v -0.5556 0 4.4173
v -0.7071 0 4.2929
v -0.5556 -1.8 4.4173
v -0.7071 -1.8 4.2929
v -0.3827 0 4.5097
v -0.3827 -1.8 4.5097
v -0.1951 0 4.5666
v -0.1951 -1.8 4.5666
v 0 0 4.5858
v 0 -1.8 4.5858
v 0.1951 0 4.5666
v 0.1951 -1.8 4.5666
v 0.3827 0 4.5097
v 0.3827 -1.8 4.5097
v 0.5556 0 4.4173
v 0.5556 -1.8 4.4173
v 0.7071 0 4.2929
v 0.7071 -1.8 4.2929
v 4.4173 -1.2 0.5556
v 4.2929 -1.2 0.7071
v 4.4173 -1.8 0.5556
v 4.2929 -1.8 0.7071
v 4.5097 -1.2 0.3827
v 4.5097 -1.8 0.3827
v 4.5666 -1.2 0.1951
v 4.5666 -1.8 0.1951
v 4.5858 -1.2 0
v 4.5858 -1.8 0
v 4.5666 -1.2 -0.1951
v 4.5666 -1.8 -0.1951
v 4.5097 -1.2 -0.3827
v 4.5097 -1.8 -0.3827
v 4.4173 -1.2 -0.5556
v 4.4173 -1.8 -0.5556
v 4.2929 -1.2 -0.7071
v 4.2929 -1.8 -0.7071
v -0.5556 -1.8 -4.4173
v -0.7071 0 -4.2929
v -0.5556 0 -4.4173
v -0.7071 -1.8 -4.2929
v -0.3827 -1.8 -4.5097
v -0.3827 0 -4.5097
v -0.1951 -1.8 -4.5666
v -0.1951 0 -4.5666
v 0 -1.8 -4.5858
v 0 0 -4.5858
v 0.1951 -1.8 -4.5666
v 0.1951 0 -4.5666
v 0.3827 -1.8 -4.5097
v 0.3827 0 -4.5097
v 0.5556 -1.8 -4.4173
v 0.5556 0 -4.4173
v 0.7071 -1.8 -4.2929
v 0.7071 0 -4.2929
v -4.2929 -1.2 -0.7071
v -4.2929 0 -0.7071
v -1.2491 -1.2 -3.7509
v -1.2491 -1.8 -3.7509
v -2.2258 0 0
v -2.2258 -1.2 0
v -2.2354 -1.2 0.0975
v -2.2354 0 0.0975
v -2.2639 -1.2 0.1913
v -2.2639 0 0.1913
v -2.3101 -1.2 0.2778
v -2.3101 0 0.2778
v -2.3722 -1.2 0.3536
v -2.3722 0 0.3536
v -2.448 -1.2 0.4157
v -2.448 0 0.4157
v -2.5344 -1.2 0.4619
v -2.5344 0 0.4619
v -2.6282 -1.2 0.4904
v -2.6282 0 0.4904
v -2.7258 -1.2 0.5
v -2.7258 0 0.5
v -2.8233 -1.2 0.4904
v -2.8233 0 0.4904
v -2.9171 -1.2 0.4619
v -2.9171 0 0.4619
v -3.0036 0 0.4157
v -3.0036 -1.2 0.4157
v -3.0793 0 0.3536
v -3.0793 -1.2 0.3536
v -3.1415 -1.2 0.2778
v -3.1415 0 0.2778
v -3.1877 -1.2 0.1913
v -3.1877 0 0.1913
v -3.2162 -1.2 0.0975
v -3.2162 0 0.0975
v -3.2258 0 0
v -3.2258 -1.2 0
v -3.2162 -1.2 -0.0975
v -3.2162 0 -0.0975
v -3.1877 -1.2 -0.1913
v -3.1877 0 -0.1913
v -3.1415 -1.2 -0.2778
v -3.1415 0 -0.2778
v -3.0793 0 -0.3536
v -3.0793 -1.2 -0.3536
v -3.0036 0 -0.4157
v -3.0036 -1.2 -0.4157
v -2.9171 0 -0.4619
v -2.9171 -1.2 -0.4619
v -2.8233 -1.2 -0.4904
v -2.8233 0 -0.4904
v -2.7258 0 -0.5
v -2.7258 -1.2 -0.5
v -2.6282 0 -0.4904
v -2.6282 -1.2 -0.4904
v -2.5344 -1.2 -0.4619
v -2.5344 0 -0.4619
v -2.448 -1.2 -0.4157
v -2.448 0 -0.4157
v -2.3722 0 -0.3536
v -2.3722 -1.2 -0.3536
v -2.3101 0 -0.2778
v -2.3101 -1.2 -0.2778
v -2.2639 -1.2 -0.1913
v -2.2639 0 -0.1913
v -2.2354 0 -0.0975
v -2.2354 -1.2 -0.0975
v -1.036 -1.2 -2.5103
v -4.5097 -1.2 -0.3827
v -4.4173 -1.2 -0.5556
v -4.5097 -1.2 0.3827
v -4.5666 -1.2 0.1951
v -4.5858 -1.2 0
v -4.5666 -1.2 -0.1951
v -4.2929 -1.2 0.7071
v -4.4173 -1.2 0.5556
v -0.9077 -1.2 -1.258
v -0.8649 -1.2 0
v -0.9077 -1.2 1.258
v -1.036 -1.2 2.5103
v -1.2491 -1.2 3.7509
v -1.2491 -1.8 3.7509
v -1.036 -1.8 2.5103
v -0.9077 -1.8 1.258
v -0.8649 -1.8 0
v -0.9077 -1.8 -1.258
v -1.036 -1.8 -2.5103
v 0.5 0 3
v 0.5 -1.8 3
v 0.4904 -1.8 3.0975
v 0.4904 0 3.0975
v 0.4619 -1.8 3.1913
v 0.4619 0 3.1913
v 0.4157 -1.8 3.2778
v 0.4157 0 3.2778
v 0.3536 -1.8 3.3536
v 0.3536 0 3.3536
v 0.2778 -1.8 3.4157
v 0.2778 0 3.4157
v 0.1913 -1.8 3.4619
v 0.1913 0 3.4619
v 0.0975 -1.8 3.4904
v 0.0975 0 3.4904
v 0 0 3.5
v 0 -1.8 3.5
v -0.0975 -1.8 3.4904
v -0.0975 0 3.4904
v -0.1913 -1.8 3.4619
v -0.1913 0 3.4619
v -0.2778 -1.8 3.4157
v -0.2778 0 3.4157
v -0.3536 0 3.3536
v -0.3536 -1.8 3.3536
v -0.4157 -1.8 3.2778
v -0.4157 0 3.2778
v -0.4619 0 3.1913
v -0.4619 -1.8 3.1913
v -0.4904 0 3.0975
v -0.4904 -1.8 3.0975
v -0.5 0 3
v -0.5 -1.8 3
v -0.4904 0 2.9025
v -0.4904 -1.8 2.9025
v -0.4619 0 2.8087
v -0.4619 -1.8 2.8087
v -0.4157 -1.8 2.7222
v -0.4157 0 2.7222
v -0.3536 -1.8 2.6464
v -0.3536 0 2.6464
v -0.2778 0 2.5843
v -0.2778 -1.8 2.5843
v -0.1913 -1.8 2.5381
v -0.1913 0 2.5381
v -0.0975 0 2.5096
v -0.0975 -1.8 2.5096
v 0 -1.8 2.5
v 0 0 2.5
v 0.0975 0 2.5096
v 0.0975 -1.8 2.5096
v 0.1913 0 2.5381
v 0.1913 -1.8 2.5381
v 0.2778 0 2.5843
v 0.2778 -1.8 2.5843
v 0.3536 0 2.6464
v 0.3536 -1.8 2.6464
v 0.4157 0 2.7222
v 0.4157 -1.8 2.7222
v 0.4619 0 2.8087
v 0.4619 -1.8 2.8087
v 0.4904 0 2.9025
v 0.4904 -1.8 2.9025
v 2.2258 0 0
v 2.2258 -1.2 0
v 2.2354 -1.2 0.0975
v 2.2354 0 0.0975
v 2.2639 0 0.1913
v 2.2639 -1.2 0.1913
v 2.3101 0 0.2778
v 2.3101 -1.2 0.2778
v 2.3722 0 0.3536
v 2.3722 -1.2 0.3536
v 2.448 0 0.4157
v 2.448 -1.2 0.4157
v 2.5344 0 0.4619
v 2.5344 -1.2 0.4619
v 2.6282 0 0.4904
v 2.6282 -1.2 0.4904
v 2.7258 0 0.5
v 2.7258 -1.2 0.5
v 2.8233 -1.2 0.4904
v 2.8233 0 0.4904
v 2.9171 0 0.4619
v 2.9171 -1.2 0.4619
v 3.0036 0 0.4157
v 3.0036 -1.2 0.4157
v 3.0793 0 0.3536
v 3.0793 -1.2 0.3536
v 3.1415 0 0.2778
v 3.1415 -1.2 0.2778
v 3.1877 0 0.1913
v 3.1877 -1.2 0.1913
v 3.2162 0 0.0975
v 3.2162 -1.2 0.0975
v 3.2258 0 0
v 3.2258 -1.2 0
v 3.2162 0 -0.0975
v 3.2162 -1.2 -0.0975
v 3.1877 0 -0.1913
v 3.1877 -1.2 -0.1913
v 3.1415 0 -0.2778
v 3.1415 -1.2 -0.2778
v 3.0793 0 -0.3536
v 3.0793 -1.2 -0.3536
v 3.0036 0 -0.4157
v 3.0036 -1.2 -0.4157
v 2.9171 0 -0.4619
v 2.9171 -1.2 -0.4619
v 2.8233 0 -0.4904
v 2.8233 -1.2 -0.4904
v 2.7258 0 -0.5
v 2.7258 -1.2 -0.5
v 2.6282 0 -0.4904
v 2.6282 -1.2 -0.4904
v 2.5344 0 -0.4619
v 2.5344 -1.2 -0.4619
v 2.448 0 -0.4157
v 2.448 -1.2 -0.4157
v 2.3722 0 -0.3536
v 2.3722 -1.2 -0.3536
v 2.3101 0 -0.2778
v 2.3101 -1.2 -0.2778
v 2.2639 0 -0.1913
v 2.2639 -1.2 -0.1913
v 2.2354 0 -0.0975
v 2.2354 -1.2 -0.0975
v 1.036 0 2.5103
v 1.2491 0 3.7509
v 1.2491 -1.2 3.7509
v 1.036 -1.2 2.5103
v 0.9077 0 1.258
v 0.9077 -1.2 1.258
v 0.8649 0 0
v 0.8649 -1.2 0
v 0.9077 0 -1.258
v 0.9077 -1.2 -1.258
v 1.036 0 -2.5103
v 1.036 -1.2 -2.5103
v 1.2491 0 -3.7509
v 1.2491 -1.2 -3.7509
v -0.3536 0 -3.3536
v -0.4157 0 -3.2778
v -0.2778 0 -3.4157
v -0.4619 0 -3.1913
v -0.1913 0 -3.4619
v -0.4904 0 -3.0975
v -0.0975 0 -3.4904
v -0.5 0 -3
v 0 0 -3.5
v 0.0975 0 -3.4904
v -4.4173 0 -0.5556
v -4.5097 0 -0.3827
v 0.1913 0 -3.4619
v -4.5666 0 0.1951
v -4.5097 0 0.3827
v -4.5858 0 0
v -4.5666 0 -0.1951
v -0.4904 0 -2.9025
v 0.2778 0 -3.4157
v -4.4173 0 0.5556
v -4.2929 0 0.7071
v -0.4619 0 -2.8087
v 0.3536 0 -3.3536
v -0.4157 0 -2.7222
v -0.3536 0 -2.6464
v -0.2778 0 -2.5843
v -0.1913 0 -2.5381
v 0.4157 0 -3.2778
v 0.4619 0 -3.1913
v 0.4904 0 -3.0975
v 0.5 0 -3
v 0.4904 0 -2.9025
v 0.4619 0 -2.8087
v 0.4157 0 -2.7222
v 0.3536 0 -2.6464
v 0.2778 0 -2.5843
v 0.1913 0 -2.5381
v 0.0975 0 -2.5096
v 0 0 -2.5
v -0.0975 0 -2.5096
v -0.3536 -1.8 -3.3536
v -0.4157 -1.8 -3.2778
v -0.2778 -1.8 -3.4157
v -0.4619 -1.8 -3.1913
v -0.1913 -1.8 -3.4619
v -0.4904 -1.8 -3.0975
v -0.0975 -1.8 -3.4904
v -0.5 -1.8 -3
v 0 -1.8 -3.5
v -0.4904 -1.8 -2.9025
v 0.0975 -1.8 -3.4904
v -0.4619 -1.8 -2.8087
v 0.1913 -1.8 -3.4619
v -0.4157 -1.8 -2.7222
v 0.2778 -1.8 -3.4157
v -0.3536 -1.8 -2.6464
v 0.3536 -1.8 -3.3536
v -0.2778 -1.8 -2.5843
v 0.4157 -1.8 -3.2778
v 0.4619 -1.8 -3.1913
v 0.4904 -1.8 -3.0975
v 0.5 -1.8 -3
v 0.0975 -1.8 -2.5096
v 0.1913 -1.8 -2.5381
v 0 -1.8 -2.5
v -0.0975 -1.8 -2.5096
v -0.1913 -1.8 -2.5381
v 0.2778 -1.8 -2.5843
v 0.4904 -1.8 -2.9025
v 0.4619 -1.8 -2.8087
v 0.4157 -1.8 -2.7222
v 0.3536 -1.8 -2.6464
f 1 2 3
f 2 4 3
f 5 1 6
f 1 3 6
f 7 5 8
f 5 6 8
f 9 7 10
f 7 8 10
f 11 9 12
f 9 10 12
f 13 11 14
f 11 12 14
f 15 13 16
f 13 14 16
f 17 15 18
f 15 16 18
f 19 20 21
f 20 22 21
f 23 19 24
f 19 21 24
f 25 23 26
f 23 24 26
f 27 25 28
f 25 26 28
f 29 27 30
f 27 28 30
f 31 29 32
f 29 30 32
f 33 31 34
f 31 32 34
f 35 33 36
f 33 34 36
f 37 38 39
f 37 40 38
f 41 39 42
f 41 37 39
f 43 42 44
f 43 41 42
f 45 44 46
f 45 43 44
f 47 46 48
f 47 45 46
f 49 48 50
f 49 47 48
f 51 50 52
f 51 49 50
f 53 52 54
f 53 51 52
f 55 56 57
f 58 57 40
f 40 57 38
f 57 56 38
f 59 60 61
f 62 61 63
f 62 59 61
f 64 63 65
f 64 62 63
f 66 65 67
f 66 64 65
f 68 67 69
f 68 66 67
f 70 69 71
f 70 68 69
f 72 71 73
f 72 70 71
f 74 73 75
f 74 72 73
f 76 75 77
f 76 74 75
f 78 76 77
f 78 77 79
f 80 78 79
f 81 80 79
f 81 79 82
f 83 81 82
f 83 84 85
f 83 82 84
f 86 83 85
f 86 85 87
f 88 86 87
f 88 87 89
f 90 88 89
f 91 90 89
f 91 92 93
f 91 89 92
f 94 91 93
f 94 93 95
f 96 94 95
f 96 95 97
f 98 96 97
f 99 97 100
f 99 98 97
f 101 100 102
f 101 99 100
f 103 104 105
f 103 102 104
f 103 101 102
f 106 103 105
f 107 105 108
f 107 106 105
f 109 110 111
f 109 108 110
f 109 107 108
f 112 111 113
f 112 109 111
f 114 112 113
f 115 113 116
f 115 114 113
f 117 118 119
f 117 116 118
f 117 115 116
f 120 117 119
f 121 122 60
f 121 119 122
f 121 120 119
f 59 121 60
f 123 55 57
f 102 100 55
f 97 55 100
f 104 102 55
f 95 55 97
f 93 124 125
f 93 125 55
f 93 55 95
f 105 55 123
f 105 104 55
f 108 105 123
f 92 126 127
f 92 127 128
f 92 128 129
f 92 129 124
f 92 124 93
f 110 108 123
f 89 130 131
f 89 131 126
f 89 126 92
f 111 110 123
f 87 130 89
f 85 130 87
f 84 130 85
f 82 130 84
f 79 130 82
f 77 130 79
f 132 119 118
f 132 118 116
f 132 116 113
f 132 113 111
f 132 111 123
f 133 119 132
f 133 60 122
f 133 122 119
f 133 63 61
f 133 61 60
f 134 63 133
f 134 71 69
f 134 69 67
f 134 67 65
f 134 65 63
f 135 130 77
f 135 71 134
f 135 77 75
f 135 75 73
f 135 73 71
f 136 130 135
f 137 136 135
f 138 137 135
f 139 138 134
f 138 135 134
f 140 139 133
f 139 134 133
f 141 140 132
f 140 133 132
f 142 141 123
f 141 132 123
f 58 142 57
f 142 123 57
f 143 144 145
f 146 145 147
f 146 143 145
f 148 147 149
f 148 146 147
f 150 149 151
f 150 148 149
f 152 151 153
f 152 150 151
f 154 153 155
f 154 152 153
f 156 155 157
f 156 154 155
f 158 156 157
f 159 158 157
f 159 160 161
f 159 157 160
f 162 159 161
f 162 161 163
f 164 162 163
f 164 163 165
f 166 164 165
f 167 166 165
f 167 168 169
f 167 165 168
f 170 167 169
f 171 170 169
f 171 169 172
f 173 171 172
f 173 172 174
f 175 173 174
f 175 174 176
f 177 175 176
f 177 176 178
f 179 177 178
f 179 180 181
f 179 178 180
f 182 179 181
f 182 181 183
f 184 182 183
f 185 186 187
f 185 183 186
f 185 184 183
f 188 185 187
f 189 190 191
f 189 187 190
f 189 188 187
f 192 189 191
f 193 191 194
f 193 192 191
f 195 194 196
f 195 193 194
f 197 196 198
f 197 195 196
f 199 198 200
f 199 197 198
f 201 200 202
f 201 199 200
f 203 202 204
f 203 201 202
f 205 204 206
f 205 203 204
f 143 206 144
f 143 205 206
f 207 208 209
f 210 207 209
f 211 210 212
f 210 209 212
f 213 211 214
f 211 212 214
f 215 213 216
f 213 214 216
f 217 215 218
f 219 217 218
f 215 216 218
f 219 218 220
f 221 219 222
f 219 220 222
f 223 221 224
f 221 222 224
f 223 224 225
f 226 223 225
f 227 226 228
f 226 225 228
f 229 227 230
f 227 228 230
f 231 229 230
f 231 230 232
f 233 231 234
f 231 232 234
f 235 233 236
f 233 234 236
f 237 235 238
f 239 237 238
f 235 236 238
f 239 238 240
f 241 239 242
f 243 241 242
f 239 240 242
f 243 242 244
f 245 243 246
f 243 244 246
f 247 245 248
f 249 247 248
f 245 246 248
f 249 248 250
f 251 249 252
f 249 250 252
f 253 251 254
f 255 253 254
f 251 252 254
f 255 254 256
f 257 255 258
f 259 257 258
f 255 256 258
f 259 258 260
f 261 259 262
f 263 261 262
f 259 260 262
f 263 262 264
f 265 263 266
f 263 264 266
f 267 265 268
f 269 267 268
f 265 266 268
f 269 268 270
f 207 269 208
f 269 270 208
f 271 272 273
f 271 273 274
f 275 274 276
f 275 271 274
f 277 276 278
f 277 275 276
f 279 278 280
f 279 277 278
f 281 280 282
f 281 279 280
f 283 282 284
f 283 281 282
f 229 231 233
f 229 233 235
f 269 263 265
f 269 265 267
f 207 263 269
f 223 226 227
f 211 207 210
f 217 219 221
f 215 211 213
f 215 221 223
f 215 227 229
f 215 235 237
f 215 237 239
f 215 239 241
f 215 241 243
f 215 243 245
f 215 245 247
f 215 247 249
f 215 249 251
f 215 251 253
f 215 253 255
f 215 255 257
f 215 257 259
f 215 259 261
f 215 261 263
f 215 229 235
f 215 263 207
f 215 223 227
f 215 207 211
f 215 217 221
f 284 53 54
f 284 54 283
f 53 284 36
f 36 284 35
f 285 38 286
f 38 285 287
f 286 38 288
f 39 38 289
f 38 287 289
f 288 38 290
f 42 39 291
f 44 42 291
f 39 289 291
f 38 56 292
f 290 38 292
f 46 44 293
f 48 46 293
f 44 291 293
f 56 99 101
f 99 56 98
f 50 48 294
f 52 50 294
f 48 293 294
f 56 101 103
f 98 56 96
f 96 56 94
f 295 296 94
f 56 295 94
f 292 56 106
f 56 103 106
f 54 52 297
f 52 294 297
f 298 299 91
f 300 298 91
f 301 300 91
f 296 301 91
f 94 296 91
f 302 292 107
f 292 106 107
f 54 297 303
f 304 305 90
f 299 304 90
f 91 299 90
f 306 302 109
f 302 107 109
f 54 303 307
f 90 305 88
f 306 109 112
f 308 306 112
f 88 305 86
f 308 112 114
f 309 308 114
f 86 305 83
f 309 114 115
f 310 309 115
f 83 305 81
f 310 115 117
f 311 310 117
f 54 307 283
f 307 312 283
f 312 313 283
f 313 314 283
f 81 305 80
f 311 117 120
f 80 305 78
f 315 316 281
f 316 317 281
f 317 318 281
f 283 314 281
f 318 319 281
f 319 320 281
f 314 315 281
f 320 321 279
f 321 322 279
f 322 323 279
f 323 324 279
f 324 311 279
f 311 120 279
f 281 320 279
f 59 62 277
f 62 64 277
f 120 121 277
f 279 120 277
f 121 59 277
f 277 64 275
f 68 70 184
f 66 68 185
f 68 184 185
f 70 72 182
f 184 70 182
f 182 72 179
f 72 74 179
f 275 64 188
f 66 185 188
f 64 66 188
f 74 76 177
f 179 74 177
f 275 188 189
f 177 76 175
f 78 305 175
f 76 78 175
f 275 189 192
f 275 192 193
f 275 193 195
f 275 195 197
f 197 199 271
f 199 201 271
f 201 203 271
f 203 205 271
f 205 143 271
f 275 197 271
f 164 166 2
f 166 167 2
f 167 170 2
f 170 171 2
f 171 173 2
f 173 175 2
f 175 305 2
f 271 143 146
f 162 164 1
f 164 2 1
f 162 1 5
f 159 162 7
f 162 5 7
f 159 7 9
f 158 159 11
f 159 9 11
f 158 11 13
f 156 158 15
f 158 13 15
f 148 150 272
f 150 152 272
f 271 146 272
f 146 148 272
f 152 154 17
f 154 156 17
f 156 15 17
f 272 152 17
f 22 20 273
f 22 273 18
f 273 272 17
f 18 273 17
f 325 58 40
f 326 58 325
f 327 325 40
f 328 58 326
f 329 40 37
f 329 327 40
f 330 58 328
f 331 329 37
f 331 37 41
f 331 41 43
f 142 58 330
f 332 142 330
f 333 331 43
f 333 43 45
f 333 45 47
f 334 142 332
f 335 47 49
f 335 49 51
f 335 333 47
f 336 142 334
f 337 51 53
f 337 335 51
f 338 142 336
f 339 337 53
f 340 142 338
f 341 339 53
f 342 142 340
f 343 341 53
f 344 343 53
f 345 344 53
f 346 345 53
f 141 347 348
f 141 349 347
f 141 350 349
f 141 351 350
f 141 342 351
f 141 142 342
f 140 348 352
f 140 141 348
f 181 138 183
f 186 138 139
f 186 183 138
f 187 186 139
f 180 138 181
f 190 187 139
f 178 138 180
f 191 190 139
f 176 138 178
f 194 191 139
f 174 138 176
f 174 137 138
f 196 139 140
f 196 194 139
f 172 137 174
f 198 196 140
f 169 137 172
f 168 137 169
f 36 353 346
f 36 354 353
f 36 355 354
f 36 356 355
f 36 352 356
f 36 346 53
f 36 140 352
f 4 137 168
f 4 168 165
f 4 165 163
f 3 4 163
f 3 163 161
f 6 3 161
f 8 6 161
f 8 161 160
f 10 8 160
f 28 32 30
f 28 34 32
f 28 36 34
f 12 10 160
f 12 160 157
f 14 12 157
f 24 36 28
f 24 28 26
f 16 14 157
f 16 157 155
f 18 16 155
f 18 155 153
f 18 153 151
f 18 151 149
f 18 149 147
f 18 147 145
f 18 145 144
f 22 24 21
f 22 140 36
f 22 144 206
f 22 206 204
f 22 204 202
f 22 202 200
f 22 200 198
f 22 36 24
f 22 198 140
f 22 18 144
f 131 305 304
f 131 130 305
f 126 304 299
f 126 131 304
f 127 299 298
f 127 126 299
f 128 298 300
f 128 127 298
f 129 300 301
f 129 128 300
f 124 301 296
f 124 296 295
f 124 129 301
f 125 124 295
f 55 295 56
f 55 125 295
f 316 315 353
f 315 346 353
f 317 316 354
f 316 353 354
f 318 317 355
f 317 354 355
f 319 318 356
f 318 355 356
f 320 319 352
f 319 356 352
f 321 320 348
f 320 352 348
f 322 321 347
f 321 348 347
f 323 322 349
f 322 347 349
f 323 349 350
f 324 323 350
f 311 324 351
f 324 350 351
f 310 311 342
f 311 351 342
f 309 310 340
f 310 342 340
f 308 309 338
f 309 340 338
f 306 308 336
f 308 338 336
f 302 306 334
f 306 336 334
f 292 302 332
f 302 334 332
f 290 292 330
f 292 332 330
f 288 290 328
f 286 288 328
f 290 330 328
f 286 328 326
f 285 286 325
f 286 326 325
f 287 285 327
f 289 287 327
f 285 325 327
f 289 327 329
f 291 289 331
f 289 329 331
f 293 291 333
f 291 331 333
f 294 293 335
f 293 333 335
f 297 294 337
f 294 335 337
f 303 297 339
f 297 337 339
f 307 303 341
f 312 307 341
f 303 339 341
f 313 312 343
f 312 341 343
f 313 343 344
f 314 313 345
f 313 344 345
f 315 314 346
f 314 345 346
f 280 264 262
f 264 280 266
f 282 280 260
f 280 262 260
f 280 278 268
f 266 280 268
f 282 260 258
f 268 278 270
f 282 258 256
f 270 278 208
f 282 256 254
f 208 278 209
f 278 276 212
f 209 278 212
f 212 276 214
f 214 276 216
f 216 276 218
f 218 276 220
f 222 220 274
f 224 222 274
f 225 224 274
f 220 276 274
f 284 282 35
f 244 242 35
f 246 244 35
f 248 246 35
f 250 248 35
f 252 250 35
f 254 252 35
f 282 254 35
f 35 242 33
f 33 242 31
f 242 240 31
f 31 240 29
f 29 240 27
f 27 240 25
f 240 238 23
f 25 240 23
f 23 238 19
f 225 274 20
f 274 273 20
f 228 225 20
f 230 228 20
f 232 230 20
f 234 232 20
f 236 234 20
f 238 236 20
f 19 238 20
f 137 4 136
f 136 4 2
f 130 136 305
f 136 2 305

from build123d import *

# Parameters (mm, degrees)
F1_DEPTH = 1.8
F2_DEPTH = 1.2
F4_DEPTH = 1.2
F5_R     = 1
F6_R     = 0.5
F7_DEPTH = 12.5
F8_R     = 0.5
F9_DEPTH = 1.2


with BuildPart() as f1:
    # F0 (on Front) → F1 (new body)
    with BuildSketch(Plane.XZ):
        with BuildLine():
            Line((5, 0), (0, 5))
            Line((0, 5), (-1.249147, 3.750853))
            ThreePointArc((-1.249147, 3.750853), (-0.864917, 0), (-1.249147, -3.750853))
            Line((-1.249147, -3.750853), (0, -5))
            Line((0, -5), (5, 0))
        make_face()
    extrude(amount=F1_DEPTH)

    # F0 (on Front) → F2 (join)
    with BuildSketch(Plane.XZ):
        with BuildLine():
            ThreePointArc((-1.249147, -3.750853), (-0.864917, 0), (-1.249147, 3.750853))
            Line((-1.249147, 3.750853), (-5, 0))
            Line((-5, 0), (-1.249147, -3.750853))
        make_face()
    extrude(amount=F2_DEPTH)

    # F3 (on face) → F4 (cut)
    with BuildSketch(Plane.XZ):
        with BuildLine():
            ThreePointArc((1.249147, 3.750853), (0.864917, 0), (1.249147, -3.750853))
            Line((1.249147, -3.750853), (5, 0))
            Line((5, 0), (1.249147, 3.750853))
        make_face()
    extrude(amount=F4_DEPTH, mode=Mode.SUBTRACT)

    # F5
    f5_edges = [f1.edges().sort_by_distance(p)[0] for p in [
        (0, -0.9, 5),
        (5, -1.5, 0),
        (0, -0.9, -5),
        (-5, -0.6, 0),
    ]]
    fillet(f5_edges, radius=F5_R)

    # F6 (on Front) → F7 (cut, symmetric)
    with BuildSketch(Plane.XZ):
        with Locations((-2.72579, 0)):
            Circle(F6_R)
        with Locations((0, 3)):
            Circle(F6_R)
        with Locations((0, -3)):
            Circle(F6_R)
    extrude(amount=F7_DEPTH, both=True, mode=Mode.SUBTRACT)

    # F8 (on face) → F9 (join)
    with BuildSketch(Plane(origin=(0, -1.2, 0), x_dir=(-1, 0, 0), z_dir=(0, 1, 0))):
        with Locations((-2.72579, 0)):
            Circle(F8_R)
    extrude(amount=F9_DEPTH)


solid = f1.part
